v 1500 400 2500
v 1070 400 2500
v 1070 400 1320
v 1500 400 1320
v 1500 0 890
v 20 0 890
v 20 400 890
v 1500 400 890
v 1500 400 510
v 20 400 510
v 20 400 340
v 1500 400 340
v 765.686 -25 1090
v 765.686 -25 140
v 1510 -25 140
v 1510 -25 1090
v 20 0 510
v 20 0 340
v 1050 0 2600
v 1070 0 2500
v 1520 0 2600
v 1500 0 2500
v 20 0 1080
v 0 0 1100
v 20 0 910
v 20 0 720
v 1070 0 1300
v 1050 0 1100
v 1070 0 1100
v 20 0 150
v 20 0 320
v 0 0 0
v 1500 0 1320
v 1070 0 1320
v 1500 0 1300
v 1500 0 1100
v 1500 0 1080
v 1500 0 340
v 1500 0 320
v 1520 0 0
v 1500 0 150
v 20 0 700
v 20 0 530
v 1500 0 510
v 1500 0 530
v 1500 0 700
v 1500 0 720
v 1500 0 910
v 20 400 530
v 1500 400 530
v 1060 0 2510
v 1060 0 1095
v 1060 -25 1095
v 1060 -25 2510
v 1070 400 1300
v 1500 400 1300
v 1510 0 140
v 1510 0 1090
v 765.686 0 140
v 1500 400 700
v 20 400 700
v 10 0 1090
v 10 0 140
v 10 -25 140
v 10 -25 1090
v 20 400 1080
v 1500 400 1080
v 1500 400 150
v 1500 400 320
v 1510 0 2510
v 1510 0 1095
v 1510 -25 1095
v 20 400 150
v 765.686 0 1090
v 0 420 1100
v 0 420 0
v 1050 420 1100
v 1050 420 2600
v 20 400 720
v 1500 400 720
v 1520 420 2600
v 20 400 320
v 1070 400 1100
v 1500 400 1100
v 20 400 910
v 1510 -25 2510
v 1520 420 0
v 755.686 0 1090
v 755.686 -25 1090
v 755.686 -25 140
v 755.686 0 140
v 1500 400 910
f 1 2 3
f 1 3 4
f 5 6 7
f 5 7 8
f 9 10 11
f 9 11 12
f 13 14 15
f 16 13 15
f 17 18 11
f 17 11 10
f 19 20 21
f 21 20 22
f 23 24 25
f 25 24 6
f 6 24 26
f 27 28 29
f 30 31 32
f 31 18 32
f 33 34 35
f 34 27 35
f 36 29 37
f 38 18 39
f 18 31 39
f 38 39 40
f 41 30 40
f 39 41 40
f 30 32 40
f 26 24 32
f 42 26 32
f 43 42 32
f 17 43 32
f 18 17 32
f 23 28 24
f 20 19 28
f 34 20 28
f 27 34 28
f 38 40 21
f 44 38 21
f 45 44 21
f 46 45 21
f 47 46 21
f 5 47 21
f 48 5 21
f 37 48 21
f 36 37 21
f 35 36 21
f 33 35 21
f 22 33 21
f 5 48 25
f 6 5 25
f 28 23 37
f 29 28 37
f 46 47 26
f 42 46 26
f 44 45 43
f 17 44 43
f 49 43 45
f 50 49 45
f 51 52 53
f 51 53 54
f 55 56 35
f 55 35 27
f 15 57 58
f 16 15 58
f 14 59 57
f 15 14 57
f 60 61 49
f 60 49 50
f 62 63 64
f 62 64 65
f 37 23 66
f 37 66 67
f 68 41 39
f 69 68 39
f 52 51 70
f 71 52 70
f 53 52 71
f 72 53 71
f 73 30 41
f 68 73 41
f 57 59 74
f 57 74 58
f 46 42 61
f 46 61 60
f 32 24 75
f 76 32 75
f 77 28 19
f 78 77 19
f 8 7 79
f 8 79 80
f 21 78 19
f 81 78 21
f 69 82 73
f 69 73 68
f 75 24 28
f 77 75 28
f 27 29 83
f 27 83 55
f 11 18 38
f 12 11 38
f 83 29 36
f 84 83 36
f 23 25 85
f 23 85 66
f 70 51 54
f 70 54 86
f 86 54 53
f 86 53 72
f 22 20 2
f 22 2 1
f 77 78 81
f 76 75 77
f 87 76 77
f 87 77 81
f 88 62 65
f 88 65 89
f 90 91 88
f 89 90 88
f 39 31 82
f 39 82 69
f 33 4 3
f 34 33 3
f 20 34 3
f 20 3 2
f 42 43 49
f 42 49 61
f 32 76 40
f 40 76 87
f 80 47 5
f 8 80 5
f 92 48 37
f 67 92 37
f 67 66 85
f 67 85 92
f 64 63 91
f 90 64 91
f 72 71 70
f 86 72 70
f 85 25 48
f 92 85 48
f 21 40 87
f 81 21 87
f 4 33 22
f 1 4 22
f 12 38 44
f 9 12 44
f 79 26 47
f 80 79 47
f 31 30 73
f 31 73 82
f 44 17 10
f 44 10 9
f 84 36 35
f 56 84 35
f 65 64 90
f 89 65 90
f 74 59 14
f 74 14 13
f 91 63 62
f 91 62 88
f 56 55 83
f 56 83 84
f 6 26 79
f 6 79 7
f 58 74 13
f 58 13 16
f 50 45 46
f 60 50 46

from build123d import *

# Parameters (mm, degrees)
F0_W      = 1520
F0_H      = 420
F1_DEPTH  = 2600
F2_W      = 1050
F2_H      = 1500
F3_DEPTH  = 420.001
F5_W      = 430
F5_H      = 1400
F6_DEPTH  = 400
F7_W      = 1480
F7_H      = 170
F8_DEPTH  = 400
F9_W      = 745.686335722
F9_H      = 950
F10_DEPTH = 25
F9_W_2    = 744.313664278
F9_W_3    = 450
F9_H_2    = 1415
F11_W     = 430
F11_H     = 20
F12_DEPTH = 400


with BuildPart() as f1:
    # F0 (on Top) → F1 (new body)
    with BuildSketch(Plane.XY):
        with Locations((760, 210)):
            Rectangle(F0_W, F0_H)
    extrude(amount=F1_DEPTH)

    # F2 (on face) → F3 (cut, through all)
    with BuildSketch(Plane.XZ):
        with Locations((525, 1850)):
            Rectangle(F2_W, F2_H)
    extrude(amount=-F3_DEPTH, mode=Mode.SUBTRACT)

    # F5 (on face) → F6 (cut, through all)
    with BuildSketch(Plane.XZ):
        with Locations((1285, 1800)):
            Rectangle(F5_W, F5_H)
    extrude(amount=-F6_DEPTH, mode=Mode.SUBTRACT)

    # F7 (on face) → F8 (cut, through all)
    with BuildSketch(Plane.XZ):
        with Locations((760, 235)):
            Rectangle(F7_W, F7_H)
        with Locations((760, 995)):
            Rectangle(F7_W, F7_H)
        with Locations((760, 425)):
            Rectangle(F7_W, F7_H)
        with Locations((760, 615)):
            Rectangle(F7_W, F7_H)
        with Locations((760, 805)):
            Rectangle(F7_W, F7_H)
    extrude(amount=-F8_DEPTH, mode=Mode.SUBTRACT)

    # F11 (on offset) → F12 (join, through all)
    with BuildSketch(Plane(origin=(0, 400, 0), x_dir=(-1, 0, 0), z_dir=(0, 1, 0))):
        with Locations((-1285, 1310)):
            Rectangle(F11_W, F11_H)
    extrude(amount=-F12_DEPTH)


with BuildPart() as f10:
    # F9 (on Front) → F10 (new body)
    with BuildSketch(Plane.XZ):
        with Locations((382.843167861, 615)):
            Rectangle(F9_W, F9_H)
    extrude(amount=F10_DEPTH)


with BuildPart() as f10b:
    # F9 (on Front) → F10, piece 2 (new body)
    with BuildSketch(Plane.XZ):
        with Locations((1137.843167861, 615)):
            Rectangle(F9_W_2, F9_H)
    extrude(amount=F10_DEPTH)


with BuildPart() as f10c:
    # F9 (on Front) → F10, piece 3 (new body)
    with BuildSketch(Plane.XZ):
        with Locations((1285, 1802.5)):
            Rectangle(F9_W_3, F9_H_2)
    extrude(amount=F10_DEPTH)


solid = Compound([f1.part, f10.part, f10b.part, f10c.part])
